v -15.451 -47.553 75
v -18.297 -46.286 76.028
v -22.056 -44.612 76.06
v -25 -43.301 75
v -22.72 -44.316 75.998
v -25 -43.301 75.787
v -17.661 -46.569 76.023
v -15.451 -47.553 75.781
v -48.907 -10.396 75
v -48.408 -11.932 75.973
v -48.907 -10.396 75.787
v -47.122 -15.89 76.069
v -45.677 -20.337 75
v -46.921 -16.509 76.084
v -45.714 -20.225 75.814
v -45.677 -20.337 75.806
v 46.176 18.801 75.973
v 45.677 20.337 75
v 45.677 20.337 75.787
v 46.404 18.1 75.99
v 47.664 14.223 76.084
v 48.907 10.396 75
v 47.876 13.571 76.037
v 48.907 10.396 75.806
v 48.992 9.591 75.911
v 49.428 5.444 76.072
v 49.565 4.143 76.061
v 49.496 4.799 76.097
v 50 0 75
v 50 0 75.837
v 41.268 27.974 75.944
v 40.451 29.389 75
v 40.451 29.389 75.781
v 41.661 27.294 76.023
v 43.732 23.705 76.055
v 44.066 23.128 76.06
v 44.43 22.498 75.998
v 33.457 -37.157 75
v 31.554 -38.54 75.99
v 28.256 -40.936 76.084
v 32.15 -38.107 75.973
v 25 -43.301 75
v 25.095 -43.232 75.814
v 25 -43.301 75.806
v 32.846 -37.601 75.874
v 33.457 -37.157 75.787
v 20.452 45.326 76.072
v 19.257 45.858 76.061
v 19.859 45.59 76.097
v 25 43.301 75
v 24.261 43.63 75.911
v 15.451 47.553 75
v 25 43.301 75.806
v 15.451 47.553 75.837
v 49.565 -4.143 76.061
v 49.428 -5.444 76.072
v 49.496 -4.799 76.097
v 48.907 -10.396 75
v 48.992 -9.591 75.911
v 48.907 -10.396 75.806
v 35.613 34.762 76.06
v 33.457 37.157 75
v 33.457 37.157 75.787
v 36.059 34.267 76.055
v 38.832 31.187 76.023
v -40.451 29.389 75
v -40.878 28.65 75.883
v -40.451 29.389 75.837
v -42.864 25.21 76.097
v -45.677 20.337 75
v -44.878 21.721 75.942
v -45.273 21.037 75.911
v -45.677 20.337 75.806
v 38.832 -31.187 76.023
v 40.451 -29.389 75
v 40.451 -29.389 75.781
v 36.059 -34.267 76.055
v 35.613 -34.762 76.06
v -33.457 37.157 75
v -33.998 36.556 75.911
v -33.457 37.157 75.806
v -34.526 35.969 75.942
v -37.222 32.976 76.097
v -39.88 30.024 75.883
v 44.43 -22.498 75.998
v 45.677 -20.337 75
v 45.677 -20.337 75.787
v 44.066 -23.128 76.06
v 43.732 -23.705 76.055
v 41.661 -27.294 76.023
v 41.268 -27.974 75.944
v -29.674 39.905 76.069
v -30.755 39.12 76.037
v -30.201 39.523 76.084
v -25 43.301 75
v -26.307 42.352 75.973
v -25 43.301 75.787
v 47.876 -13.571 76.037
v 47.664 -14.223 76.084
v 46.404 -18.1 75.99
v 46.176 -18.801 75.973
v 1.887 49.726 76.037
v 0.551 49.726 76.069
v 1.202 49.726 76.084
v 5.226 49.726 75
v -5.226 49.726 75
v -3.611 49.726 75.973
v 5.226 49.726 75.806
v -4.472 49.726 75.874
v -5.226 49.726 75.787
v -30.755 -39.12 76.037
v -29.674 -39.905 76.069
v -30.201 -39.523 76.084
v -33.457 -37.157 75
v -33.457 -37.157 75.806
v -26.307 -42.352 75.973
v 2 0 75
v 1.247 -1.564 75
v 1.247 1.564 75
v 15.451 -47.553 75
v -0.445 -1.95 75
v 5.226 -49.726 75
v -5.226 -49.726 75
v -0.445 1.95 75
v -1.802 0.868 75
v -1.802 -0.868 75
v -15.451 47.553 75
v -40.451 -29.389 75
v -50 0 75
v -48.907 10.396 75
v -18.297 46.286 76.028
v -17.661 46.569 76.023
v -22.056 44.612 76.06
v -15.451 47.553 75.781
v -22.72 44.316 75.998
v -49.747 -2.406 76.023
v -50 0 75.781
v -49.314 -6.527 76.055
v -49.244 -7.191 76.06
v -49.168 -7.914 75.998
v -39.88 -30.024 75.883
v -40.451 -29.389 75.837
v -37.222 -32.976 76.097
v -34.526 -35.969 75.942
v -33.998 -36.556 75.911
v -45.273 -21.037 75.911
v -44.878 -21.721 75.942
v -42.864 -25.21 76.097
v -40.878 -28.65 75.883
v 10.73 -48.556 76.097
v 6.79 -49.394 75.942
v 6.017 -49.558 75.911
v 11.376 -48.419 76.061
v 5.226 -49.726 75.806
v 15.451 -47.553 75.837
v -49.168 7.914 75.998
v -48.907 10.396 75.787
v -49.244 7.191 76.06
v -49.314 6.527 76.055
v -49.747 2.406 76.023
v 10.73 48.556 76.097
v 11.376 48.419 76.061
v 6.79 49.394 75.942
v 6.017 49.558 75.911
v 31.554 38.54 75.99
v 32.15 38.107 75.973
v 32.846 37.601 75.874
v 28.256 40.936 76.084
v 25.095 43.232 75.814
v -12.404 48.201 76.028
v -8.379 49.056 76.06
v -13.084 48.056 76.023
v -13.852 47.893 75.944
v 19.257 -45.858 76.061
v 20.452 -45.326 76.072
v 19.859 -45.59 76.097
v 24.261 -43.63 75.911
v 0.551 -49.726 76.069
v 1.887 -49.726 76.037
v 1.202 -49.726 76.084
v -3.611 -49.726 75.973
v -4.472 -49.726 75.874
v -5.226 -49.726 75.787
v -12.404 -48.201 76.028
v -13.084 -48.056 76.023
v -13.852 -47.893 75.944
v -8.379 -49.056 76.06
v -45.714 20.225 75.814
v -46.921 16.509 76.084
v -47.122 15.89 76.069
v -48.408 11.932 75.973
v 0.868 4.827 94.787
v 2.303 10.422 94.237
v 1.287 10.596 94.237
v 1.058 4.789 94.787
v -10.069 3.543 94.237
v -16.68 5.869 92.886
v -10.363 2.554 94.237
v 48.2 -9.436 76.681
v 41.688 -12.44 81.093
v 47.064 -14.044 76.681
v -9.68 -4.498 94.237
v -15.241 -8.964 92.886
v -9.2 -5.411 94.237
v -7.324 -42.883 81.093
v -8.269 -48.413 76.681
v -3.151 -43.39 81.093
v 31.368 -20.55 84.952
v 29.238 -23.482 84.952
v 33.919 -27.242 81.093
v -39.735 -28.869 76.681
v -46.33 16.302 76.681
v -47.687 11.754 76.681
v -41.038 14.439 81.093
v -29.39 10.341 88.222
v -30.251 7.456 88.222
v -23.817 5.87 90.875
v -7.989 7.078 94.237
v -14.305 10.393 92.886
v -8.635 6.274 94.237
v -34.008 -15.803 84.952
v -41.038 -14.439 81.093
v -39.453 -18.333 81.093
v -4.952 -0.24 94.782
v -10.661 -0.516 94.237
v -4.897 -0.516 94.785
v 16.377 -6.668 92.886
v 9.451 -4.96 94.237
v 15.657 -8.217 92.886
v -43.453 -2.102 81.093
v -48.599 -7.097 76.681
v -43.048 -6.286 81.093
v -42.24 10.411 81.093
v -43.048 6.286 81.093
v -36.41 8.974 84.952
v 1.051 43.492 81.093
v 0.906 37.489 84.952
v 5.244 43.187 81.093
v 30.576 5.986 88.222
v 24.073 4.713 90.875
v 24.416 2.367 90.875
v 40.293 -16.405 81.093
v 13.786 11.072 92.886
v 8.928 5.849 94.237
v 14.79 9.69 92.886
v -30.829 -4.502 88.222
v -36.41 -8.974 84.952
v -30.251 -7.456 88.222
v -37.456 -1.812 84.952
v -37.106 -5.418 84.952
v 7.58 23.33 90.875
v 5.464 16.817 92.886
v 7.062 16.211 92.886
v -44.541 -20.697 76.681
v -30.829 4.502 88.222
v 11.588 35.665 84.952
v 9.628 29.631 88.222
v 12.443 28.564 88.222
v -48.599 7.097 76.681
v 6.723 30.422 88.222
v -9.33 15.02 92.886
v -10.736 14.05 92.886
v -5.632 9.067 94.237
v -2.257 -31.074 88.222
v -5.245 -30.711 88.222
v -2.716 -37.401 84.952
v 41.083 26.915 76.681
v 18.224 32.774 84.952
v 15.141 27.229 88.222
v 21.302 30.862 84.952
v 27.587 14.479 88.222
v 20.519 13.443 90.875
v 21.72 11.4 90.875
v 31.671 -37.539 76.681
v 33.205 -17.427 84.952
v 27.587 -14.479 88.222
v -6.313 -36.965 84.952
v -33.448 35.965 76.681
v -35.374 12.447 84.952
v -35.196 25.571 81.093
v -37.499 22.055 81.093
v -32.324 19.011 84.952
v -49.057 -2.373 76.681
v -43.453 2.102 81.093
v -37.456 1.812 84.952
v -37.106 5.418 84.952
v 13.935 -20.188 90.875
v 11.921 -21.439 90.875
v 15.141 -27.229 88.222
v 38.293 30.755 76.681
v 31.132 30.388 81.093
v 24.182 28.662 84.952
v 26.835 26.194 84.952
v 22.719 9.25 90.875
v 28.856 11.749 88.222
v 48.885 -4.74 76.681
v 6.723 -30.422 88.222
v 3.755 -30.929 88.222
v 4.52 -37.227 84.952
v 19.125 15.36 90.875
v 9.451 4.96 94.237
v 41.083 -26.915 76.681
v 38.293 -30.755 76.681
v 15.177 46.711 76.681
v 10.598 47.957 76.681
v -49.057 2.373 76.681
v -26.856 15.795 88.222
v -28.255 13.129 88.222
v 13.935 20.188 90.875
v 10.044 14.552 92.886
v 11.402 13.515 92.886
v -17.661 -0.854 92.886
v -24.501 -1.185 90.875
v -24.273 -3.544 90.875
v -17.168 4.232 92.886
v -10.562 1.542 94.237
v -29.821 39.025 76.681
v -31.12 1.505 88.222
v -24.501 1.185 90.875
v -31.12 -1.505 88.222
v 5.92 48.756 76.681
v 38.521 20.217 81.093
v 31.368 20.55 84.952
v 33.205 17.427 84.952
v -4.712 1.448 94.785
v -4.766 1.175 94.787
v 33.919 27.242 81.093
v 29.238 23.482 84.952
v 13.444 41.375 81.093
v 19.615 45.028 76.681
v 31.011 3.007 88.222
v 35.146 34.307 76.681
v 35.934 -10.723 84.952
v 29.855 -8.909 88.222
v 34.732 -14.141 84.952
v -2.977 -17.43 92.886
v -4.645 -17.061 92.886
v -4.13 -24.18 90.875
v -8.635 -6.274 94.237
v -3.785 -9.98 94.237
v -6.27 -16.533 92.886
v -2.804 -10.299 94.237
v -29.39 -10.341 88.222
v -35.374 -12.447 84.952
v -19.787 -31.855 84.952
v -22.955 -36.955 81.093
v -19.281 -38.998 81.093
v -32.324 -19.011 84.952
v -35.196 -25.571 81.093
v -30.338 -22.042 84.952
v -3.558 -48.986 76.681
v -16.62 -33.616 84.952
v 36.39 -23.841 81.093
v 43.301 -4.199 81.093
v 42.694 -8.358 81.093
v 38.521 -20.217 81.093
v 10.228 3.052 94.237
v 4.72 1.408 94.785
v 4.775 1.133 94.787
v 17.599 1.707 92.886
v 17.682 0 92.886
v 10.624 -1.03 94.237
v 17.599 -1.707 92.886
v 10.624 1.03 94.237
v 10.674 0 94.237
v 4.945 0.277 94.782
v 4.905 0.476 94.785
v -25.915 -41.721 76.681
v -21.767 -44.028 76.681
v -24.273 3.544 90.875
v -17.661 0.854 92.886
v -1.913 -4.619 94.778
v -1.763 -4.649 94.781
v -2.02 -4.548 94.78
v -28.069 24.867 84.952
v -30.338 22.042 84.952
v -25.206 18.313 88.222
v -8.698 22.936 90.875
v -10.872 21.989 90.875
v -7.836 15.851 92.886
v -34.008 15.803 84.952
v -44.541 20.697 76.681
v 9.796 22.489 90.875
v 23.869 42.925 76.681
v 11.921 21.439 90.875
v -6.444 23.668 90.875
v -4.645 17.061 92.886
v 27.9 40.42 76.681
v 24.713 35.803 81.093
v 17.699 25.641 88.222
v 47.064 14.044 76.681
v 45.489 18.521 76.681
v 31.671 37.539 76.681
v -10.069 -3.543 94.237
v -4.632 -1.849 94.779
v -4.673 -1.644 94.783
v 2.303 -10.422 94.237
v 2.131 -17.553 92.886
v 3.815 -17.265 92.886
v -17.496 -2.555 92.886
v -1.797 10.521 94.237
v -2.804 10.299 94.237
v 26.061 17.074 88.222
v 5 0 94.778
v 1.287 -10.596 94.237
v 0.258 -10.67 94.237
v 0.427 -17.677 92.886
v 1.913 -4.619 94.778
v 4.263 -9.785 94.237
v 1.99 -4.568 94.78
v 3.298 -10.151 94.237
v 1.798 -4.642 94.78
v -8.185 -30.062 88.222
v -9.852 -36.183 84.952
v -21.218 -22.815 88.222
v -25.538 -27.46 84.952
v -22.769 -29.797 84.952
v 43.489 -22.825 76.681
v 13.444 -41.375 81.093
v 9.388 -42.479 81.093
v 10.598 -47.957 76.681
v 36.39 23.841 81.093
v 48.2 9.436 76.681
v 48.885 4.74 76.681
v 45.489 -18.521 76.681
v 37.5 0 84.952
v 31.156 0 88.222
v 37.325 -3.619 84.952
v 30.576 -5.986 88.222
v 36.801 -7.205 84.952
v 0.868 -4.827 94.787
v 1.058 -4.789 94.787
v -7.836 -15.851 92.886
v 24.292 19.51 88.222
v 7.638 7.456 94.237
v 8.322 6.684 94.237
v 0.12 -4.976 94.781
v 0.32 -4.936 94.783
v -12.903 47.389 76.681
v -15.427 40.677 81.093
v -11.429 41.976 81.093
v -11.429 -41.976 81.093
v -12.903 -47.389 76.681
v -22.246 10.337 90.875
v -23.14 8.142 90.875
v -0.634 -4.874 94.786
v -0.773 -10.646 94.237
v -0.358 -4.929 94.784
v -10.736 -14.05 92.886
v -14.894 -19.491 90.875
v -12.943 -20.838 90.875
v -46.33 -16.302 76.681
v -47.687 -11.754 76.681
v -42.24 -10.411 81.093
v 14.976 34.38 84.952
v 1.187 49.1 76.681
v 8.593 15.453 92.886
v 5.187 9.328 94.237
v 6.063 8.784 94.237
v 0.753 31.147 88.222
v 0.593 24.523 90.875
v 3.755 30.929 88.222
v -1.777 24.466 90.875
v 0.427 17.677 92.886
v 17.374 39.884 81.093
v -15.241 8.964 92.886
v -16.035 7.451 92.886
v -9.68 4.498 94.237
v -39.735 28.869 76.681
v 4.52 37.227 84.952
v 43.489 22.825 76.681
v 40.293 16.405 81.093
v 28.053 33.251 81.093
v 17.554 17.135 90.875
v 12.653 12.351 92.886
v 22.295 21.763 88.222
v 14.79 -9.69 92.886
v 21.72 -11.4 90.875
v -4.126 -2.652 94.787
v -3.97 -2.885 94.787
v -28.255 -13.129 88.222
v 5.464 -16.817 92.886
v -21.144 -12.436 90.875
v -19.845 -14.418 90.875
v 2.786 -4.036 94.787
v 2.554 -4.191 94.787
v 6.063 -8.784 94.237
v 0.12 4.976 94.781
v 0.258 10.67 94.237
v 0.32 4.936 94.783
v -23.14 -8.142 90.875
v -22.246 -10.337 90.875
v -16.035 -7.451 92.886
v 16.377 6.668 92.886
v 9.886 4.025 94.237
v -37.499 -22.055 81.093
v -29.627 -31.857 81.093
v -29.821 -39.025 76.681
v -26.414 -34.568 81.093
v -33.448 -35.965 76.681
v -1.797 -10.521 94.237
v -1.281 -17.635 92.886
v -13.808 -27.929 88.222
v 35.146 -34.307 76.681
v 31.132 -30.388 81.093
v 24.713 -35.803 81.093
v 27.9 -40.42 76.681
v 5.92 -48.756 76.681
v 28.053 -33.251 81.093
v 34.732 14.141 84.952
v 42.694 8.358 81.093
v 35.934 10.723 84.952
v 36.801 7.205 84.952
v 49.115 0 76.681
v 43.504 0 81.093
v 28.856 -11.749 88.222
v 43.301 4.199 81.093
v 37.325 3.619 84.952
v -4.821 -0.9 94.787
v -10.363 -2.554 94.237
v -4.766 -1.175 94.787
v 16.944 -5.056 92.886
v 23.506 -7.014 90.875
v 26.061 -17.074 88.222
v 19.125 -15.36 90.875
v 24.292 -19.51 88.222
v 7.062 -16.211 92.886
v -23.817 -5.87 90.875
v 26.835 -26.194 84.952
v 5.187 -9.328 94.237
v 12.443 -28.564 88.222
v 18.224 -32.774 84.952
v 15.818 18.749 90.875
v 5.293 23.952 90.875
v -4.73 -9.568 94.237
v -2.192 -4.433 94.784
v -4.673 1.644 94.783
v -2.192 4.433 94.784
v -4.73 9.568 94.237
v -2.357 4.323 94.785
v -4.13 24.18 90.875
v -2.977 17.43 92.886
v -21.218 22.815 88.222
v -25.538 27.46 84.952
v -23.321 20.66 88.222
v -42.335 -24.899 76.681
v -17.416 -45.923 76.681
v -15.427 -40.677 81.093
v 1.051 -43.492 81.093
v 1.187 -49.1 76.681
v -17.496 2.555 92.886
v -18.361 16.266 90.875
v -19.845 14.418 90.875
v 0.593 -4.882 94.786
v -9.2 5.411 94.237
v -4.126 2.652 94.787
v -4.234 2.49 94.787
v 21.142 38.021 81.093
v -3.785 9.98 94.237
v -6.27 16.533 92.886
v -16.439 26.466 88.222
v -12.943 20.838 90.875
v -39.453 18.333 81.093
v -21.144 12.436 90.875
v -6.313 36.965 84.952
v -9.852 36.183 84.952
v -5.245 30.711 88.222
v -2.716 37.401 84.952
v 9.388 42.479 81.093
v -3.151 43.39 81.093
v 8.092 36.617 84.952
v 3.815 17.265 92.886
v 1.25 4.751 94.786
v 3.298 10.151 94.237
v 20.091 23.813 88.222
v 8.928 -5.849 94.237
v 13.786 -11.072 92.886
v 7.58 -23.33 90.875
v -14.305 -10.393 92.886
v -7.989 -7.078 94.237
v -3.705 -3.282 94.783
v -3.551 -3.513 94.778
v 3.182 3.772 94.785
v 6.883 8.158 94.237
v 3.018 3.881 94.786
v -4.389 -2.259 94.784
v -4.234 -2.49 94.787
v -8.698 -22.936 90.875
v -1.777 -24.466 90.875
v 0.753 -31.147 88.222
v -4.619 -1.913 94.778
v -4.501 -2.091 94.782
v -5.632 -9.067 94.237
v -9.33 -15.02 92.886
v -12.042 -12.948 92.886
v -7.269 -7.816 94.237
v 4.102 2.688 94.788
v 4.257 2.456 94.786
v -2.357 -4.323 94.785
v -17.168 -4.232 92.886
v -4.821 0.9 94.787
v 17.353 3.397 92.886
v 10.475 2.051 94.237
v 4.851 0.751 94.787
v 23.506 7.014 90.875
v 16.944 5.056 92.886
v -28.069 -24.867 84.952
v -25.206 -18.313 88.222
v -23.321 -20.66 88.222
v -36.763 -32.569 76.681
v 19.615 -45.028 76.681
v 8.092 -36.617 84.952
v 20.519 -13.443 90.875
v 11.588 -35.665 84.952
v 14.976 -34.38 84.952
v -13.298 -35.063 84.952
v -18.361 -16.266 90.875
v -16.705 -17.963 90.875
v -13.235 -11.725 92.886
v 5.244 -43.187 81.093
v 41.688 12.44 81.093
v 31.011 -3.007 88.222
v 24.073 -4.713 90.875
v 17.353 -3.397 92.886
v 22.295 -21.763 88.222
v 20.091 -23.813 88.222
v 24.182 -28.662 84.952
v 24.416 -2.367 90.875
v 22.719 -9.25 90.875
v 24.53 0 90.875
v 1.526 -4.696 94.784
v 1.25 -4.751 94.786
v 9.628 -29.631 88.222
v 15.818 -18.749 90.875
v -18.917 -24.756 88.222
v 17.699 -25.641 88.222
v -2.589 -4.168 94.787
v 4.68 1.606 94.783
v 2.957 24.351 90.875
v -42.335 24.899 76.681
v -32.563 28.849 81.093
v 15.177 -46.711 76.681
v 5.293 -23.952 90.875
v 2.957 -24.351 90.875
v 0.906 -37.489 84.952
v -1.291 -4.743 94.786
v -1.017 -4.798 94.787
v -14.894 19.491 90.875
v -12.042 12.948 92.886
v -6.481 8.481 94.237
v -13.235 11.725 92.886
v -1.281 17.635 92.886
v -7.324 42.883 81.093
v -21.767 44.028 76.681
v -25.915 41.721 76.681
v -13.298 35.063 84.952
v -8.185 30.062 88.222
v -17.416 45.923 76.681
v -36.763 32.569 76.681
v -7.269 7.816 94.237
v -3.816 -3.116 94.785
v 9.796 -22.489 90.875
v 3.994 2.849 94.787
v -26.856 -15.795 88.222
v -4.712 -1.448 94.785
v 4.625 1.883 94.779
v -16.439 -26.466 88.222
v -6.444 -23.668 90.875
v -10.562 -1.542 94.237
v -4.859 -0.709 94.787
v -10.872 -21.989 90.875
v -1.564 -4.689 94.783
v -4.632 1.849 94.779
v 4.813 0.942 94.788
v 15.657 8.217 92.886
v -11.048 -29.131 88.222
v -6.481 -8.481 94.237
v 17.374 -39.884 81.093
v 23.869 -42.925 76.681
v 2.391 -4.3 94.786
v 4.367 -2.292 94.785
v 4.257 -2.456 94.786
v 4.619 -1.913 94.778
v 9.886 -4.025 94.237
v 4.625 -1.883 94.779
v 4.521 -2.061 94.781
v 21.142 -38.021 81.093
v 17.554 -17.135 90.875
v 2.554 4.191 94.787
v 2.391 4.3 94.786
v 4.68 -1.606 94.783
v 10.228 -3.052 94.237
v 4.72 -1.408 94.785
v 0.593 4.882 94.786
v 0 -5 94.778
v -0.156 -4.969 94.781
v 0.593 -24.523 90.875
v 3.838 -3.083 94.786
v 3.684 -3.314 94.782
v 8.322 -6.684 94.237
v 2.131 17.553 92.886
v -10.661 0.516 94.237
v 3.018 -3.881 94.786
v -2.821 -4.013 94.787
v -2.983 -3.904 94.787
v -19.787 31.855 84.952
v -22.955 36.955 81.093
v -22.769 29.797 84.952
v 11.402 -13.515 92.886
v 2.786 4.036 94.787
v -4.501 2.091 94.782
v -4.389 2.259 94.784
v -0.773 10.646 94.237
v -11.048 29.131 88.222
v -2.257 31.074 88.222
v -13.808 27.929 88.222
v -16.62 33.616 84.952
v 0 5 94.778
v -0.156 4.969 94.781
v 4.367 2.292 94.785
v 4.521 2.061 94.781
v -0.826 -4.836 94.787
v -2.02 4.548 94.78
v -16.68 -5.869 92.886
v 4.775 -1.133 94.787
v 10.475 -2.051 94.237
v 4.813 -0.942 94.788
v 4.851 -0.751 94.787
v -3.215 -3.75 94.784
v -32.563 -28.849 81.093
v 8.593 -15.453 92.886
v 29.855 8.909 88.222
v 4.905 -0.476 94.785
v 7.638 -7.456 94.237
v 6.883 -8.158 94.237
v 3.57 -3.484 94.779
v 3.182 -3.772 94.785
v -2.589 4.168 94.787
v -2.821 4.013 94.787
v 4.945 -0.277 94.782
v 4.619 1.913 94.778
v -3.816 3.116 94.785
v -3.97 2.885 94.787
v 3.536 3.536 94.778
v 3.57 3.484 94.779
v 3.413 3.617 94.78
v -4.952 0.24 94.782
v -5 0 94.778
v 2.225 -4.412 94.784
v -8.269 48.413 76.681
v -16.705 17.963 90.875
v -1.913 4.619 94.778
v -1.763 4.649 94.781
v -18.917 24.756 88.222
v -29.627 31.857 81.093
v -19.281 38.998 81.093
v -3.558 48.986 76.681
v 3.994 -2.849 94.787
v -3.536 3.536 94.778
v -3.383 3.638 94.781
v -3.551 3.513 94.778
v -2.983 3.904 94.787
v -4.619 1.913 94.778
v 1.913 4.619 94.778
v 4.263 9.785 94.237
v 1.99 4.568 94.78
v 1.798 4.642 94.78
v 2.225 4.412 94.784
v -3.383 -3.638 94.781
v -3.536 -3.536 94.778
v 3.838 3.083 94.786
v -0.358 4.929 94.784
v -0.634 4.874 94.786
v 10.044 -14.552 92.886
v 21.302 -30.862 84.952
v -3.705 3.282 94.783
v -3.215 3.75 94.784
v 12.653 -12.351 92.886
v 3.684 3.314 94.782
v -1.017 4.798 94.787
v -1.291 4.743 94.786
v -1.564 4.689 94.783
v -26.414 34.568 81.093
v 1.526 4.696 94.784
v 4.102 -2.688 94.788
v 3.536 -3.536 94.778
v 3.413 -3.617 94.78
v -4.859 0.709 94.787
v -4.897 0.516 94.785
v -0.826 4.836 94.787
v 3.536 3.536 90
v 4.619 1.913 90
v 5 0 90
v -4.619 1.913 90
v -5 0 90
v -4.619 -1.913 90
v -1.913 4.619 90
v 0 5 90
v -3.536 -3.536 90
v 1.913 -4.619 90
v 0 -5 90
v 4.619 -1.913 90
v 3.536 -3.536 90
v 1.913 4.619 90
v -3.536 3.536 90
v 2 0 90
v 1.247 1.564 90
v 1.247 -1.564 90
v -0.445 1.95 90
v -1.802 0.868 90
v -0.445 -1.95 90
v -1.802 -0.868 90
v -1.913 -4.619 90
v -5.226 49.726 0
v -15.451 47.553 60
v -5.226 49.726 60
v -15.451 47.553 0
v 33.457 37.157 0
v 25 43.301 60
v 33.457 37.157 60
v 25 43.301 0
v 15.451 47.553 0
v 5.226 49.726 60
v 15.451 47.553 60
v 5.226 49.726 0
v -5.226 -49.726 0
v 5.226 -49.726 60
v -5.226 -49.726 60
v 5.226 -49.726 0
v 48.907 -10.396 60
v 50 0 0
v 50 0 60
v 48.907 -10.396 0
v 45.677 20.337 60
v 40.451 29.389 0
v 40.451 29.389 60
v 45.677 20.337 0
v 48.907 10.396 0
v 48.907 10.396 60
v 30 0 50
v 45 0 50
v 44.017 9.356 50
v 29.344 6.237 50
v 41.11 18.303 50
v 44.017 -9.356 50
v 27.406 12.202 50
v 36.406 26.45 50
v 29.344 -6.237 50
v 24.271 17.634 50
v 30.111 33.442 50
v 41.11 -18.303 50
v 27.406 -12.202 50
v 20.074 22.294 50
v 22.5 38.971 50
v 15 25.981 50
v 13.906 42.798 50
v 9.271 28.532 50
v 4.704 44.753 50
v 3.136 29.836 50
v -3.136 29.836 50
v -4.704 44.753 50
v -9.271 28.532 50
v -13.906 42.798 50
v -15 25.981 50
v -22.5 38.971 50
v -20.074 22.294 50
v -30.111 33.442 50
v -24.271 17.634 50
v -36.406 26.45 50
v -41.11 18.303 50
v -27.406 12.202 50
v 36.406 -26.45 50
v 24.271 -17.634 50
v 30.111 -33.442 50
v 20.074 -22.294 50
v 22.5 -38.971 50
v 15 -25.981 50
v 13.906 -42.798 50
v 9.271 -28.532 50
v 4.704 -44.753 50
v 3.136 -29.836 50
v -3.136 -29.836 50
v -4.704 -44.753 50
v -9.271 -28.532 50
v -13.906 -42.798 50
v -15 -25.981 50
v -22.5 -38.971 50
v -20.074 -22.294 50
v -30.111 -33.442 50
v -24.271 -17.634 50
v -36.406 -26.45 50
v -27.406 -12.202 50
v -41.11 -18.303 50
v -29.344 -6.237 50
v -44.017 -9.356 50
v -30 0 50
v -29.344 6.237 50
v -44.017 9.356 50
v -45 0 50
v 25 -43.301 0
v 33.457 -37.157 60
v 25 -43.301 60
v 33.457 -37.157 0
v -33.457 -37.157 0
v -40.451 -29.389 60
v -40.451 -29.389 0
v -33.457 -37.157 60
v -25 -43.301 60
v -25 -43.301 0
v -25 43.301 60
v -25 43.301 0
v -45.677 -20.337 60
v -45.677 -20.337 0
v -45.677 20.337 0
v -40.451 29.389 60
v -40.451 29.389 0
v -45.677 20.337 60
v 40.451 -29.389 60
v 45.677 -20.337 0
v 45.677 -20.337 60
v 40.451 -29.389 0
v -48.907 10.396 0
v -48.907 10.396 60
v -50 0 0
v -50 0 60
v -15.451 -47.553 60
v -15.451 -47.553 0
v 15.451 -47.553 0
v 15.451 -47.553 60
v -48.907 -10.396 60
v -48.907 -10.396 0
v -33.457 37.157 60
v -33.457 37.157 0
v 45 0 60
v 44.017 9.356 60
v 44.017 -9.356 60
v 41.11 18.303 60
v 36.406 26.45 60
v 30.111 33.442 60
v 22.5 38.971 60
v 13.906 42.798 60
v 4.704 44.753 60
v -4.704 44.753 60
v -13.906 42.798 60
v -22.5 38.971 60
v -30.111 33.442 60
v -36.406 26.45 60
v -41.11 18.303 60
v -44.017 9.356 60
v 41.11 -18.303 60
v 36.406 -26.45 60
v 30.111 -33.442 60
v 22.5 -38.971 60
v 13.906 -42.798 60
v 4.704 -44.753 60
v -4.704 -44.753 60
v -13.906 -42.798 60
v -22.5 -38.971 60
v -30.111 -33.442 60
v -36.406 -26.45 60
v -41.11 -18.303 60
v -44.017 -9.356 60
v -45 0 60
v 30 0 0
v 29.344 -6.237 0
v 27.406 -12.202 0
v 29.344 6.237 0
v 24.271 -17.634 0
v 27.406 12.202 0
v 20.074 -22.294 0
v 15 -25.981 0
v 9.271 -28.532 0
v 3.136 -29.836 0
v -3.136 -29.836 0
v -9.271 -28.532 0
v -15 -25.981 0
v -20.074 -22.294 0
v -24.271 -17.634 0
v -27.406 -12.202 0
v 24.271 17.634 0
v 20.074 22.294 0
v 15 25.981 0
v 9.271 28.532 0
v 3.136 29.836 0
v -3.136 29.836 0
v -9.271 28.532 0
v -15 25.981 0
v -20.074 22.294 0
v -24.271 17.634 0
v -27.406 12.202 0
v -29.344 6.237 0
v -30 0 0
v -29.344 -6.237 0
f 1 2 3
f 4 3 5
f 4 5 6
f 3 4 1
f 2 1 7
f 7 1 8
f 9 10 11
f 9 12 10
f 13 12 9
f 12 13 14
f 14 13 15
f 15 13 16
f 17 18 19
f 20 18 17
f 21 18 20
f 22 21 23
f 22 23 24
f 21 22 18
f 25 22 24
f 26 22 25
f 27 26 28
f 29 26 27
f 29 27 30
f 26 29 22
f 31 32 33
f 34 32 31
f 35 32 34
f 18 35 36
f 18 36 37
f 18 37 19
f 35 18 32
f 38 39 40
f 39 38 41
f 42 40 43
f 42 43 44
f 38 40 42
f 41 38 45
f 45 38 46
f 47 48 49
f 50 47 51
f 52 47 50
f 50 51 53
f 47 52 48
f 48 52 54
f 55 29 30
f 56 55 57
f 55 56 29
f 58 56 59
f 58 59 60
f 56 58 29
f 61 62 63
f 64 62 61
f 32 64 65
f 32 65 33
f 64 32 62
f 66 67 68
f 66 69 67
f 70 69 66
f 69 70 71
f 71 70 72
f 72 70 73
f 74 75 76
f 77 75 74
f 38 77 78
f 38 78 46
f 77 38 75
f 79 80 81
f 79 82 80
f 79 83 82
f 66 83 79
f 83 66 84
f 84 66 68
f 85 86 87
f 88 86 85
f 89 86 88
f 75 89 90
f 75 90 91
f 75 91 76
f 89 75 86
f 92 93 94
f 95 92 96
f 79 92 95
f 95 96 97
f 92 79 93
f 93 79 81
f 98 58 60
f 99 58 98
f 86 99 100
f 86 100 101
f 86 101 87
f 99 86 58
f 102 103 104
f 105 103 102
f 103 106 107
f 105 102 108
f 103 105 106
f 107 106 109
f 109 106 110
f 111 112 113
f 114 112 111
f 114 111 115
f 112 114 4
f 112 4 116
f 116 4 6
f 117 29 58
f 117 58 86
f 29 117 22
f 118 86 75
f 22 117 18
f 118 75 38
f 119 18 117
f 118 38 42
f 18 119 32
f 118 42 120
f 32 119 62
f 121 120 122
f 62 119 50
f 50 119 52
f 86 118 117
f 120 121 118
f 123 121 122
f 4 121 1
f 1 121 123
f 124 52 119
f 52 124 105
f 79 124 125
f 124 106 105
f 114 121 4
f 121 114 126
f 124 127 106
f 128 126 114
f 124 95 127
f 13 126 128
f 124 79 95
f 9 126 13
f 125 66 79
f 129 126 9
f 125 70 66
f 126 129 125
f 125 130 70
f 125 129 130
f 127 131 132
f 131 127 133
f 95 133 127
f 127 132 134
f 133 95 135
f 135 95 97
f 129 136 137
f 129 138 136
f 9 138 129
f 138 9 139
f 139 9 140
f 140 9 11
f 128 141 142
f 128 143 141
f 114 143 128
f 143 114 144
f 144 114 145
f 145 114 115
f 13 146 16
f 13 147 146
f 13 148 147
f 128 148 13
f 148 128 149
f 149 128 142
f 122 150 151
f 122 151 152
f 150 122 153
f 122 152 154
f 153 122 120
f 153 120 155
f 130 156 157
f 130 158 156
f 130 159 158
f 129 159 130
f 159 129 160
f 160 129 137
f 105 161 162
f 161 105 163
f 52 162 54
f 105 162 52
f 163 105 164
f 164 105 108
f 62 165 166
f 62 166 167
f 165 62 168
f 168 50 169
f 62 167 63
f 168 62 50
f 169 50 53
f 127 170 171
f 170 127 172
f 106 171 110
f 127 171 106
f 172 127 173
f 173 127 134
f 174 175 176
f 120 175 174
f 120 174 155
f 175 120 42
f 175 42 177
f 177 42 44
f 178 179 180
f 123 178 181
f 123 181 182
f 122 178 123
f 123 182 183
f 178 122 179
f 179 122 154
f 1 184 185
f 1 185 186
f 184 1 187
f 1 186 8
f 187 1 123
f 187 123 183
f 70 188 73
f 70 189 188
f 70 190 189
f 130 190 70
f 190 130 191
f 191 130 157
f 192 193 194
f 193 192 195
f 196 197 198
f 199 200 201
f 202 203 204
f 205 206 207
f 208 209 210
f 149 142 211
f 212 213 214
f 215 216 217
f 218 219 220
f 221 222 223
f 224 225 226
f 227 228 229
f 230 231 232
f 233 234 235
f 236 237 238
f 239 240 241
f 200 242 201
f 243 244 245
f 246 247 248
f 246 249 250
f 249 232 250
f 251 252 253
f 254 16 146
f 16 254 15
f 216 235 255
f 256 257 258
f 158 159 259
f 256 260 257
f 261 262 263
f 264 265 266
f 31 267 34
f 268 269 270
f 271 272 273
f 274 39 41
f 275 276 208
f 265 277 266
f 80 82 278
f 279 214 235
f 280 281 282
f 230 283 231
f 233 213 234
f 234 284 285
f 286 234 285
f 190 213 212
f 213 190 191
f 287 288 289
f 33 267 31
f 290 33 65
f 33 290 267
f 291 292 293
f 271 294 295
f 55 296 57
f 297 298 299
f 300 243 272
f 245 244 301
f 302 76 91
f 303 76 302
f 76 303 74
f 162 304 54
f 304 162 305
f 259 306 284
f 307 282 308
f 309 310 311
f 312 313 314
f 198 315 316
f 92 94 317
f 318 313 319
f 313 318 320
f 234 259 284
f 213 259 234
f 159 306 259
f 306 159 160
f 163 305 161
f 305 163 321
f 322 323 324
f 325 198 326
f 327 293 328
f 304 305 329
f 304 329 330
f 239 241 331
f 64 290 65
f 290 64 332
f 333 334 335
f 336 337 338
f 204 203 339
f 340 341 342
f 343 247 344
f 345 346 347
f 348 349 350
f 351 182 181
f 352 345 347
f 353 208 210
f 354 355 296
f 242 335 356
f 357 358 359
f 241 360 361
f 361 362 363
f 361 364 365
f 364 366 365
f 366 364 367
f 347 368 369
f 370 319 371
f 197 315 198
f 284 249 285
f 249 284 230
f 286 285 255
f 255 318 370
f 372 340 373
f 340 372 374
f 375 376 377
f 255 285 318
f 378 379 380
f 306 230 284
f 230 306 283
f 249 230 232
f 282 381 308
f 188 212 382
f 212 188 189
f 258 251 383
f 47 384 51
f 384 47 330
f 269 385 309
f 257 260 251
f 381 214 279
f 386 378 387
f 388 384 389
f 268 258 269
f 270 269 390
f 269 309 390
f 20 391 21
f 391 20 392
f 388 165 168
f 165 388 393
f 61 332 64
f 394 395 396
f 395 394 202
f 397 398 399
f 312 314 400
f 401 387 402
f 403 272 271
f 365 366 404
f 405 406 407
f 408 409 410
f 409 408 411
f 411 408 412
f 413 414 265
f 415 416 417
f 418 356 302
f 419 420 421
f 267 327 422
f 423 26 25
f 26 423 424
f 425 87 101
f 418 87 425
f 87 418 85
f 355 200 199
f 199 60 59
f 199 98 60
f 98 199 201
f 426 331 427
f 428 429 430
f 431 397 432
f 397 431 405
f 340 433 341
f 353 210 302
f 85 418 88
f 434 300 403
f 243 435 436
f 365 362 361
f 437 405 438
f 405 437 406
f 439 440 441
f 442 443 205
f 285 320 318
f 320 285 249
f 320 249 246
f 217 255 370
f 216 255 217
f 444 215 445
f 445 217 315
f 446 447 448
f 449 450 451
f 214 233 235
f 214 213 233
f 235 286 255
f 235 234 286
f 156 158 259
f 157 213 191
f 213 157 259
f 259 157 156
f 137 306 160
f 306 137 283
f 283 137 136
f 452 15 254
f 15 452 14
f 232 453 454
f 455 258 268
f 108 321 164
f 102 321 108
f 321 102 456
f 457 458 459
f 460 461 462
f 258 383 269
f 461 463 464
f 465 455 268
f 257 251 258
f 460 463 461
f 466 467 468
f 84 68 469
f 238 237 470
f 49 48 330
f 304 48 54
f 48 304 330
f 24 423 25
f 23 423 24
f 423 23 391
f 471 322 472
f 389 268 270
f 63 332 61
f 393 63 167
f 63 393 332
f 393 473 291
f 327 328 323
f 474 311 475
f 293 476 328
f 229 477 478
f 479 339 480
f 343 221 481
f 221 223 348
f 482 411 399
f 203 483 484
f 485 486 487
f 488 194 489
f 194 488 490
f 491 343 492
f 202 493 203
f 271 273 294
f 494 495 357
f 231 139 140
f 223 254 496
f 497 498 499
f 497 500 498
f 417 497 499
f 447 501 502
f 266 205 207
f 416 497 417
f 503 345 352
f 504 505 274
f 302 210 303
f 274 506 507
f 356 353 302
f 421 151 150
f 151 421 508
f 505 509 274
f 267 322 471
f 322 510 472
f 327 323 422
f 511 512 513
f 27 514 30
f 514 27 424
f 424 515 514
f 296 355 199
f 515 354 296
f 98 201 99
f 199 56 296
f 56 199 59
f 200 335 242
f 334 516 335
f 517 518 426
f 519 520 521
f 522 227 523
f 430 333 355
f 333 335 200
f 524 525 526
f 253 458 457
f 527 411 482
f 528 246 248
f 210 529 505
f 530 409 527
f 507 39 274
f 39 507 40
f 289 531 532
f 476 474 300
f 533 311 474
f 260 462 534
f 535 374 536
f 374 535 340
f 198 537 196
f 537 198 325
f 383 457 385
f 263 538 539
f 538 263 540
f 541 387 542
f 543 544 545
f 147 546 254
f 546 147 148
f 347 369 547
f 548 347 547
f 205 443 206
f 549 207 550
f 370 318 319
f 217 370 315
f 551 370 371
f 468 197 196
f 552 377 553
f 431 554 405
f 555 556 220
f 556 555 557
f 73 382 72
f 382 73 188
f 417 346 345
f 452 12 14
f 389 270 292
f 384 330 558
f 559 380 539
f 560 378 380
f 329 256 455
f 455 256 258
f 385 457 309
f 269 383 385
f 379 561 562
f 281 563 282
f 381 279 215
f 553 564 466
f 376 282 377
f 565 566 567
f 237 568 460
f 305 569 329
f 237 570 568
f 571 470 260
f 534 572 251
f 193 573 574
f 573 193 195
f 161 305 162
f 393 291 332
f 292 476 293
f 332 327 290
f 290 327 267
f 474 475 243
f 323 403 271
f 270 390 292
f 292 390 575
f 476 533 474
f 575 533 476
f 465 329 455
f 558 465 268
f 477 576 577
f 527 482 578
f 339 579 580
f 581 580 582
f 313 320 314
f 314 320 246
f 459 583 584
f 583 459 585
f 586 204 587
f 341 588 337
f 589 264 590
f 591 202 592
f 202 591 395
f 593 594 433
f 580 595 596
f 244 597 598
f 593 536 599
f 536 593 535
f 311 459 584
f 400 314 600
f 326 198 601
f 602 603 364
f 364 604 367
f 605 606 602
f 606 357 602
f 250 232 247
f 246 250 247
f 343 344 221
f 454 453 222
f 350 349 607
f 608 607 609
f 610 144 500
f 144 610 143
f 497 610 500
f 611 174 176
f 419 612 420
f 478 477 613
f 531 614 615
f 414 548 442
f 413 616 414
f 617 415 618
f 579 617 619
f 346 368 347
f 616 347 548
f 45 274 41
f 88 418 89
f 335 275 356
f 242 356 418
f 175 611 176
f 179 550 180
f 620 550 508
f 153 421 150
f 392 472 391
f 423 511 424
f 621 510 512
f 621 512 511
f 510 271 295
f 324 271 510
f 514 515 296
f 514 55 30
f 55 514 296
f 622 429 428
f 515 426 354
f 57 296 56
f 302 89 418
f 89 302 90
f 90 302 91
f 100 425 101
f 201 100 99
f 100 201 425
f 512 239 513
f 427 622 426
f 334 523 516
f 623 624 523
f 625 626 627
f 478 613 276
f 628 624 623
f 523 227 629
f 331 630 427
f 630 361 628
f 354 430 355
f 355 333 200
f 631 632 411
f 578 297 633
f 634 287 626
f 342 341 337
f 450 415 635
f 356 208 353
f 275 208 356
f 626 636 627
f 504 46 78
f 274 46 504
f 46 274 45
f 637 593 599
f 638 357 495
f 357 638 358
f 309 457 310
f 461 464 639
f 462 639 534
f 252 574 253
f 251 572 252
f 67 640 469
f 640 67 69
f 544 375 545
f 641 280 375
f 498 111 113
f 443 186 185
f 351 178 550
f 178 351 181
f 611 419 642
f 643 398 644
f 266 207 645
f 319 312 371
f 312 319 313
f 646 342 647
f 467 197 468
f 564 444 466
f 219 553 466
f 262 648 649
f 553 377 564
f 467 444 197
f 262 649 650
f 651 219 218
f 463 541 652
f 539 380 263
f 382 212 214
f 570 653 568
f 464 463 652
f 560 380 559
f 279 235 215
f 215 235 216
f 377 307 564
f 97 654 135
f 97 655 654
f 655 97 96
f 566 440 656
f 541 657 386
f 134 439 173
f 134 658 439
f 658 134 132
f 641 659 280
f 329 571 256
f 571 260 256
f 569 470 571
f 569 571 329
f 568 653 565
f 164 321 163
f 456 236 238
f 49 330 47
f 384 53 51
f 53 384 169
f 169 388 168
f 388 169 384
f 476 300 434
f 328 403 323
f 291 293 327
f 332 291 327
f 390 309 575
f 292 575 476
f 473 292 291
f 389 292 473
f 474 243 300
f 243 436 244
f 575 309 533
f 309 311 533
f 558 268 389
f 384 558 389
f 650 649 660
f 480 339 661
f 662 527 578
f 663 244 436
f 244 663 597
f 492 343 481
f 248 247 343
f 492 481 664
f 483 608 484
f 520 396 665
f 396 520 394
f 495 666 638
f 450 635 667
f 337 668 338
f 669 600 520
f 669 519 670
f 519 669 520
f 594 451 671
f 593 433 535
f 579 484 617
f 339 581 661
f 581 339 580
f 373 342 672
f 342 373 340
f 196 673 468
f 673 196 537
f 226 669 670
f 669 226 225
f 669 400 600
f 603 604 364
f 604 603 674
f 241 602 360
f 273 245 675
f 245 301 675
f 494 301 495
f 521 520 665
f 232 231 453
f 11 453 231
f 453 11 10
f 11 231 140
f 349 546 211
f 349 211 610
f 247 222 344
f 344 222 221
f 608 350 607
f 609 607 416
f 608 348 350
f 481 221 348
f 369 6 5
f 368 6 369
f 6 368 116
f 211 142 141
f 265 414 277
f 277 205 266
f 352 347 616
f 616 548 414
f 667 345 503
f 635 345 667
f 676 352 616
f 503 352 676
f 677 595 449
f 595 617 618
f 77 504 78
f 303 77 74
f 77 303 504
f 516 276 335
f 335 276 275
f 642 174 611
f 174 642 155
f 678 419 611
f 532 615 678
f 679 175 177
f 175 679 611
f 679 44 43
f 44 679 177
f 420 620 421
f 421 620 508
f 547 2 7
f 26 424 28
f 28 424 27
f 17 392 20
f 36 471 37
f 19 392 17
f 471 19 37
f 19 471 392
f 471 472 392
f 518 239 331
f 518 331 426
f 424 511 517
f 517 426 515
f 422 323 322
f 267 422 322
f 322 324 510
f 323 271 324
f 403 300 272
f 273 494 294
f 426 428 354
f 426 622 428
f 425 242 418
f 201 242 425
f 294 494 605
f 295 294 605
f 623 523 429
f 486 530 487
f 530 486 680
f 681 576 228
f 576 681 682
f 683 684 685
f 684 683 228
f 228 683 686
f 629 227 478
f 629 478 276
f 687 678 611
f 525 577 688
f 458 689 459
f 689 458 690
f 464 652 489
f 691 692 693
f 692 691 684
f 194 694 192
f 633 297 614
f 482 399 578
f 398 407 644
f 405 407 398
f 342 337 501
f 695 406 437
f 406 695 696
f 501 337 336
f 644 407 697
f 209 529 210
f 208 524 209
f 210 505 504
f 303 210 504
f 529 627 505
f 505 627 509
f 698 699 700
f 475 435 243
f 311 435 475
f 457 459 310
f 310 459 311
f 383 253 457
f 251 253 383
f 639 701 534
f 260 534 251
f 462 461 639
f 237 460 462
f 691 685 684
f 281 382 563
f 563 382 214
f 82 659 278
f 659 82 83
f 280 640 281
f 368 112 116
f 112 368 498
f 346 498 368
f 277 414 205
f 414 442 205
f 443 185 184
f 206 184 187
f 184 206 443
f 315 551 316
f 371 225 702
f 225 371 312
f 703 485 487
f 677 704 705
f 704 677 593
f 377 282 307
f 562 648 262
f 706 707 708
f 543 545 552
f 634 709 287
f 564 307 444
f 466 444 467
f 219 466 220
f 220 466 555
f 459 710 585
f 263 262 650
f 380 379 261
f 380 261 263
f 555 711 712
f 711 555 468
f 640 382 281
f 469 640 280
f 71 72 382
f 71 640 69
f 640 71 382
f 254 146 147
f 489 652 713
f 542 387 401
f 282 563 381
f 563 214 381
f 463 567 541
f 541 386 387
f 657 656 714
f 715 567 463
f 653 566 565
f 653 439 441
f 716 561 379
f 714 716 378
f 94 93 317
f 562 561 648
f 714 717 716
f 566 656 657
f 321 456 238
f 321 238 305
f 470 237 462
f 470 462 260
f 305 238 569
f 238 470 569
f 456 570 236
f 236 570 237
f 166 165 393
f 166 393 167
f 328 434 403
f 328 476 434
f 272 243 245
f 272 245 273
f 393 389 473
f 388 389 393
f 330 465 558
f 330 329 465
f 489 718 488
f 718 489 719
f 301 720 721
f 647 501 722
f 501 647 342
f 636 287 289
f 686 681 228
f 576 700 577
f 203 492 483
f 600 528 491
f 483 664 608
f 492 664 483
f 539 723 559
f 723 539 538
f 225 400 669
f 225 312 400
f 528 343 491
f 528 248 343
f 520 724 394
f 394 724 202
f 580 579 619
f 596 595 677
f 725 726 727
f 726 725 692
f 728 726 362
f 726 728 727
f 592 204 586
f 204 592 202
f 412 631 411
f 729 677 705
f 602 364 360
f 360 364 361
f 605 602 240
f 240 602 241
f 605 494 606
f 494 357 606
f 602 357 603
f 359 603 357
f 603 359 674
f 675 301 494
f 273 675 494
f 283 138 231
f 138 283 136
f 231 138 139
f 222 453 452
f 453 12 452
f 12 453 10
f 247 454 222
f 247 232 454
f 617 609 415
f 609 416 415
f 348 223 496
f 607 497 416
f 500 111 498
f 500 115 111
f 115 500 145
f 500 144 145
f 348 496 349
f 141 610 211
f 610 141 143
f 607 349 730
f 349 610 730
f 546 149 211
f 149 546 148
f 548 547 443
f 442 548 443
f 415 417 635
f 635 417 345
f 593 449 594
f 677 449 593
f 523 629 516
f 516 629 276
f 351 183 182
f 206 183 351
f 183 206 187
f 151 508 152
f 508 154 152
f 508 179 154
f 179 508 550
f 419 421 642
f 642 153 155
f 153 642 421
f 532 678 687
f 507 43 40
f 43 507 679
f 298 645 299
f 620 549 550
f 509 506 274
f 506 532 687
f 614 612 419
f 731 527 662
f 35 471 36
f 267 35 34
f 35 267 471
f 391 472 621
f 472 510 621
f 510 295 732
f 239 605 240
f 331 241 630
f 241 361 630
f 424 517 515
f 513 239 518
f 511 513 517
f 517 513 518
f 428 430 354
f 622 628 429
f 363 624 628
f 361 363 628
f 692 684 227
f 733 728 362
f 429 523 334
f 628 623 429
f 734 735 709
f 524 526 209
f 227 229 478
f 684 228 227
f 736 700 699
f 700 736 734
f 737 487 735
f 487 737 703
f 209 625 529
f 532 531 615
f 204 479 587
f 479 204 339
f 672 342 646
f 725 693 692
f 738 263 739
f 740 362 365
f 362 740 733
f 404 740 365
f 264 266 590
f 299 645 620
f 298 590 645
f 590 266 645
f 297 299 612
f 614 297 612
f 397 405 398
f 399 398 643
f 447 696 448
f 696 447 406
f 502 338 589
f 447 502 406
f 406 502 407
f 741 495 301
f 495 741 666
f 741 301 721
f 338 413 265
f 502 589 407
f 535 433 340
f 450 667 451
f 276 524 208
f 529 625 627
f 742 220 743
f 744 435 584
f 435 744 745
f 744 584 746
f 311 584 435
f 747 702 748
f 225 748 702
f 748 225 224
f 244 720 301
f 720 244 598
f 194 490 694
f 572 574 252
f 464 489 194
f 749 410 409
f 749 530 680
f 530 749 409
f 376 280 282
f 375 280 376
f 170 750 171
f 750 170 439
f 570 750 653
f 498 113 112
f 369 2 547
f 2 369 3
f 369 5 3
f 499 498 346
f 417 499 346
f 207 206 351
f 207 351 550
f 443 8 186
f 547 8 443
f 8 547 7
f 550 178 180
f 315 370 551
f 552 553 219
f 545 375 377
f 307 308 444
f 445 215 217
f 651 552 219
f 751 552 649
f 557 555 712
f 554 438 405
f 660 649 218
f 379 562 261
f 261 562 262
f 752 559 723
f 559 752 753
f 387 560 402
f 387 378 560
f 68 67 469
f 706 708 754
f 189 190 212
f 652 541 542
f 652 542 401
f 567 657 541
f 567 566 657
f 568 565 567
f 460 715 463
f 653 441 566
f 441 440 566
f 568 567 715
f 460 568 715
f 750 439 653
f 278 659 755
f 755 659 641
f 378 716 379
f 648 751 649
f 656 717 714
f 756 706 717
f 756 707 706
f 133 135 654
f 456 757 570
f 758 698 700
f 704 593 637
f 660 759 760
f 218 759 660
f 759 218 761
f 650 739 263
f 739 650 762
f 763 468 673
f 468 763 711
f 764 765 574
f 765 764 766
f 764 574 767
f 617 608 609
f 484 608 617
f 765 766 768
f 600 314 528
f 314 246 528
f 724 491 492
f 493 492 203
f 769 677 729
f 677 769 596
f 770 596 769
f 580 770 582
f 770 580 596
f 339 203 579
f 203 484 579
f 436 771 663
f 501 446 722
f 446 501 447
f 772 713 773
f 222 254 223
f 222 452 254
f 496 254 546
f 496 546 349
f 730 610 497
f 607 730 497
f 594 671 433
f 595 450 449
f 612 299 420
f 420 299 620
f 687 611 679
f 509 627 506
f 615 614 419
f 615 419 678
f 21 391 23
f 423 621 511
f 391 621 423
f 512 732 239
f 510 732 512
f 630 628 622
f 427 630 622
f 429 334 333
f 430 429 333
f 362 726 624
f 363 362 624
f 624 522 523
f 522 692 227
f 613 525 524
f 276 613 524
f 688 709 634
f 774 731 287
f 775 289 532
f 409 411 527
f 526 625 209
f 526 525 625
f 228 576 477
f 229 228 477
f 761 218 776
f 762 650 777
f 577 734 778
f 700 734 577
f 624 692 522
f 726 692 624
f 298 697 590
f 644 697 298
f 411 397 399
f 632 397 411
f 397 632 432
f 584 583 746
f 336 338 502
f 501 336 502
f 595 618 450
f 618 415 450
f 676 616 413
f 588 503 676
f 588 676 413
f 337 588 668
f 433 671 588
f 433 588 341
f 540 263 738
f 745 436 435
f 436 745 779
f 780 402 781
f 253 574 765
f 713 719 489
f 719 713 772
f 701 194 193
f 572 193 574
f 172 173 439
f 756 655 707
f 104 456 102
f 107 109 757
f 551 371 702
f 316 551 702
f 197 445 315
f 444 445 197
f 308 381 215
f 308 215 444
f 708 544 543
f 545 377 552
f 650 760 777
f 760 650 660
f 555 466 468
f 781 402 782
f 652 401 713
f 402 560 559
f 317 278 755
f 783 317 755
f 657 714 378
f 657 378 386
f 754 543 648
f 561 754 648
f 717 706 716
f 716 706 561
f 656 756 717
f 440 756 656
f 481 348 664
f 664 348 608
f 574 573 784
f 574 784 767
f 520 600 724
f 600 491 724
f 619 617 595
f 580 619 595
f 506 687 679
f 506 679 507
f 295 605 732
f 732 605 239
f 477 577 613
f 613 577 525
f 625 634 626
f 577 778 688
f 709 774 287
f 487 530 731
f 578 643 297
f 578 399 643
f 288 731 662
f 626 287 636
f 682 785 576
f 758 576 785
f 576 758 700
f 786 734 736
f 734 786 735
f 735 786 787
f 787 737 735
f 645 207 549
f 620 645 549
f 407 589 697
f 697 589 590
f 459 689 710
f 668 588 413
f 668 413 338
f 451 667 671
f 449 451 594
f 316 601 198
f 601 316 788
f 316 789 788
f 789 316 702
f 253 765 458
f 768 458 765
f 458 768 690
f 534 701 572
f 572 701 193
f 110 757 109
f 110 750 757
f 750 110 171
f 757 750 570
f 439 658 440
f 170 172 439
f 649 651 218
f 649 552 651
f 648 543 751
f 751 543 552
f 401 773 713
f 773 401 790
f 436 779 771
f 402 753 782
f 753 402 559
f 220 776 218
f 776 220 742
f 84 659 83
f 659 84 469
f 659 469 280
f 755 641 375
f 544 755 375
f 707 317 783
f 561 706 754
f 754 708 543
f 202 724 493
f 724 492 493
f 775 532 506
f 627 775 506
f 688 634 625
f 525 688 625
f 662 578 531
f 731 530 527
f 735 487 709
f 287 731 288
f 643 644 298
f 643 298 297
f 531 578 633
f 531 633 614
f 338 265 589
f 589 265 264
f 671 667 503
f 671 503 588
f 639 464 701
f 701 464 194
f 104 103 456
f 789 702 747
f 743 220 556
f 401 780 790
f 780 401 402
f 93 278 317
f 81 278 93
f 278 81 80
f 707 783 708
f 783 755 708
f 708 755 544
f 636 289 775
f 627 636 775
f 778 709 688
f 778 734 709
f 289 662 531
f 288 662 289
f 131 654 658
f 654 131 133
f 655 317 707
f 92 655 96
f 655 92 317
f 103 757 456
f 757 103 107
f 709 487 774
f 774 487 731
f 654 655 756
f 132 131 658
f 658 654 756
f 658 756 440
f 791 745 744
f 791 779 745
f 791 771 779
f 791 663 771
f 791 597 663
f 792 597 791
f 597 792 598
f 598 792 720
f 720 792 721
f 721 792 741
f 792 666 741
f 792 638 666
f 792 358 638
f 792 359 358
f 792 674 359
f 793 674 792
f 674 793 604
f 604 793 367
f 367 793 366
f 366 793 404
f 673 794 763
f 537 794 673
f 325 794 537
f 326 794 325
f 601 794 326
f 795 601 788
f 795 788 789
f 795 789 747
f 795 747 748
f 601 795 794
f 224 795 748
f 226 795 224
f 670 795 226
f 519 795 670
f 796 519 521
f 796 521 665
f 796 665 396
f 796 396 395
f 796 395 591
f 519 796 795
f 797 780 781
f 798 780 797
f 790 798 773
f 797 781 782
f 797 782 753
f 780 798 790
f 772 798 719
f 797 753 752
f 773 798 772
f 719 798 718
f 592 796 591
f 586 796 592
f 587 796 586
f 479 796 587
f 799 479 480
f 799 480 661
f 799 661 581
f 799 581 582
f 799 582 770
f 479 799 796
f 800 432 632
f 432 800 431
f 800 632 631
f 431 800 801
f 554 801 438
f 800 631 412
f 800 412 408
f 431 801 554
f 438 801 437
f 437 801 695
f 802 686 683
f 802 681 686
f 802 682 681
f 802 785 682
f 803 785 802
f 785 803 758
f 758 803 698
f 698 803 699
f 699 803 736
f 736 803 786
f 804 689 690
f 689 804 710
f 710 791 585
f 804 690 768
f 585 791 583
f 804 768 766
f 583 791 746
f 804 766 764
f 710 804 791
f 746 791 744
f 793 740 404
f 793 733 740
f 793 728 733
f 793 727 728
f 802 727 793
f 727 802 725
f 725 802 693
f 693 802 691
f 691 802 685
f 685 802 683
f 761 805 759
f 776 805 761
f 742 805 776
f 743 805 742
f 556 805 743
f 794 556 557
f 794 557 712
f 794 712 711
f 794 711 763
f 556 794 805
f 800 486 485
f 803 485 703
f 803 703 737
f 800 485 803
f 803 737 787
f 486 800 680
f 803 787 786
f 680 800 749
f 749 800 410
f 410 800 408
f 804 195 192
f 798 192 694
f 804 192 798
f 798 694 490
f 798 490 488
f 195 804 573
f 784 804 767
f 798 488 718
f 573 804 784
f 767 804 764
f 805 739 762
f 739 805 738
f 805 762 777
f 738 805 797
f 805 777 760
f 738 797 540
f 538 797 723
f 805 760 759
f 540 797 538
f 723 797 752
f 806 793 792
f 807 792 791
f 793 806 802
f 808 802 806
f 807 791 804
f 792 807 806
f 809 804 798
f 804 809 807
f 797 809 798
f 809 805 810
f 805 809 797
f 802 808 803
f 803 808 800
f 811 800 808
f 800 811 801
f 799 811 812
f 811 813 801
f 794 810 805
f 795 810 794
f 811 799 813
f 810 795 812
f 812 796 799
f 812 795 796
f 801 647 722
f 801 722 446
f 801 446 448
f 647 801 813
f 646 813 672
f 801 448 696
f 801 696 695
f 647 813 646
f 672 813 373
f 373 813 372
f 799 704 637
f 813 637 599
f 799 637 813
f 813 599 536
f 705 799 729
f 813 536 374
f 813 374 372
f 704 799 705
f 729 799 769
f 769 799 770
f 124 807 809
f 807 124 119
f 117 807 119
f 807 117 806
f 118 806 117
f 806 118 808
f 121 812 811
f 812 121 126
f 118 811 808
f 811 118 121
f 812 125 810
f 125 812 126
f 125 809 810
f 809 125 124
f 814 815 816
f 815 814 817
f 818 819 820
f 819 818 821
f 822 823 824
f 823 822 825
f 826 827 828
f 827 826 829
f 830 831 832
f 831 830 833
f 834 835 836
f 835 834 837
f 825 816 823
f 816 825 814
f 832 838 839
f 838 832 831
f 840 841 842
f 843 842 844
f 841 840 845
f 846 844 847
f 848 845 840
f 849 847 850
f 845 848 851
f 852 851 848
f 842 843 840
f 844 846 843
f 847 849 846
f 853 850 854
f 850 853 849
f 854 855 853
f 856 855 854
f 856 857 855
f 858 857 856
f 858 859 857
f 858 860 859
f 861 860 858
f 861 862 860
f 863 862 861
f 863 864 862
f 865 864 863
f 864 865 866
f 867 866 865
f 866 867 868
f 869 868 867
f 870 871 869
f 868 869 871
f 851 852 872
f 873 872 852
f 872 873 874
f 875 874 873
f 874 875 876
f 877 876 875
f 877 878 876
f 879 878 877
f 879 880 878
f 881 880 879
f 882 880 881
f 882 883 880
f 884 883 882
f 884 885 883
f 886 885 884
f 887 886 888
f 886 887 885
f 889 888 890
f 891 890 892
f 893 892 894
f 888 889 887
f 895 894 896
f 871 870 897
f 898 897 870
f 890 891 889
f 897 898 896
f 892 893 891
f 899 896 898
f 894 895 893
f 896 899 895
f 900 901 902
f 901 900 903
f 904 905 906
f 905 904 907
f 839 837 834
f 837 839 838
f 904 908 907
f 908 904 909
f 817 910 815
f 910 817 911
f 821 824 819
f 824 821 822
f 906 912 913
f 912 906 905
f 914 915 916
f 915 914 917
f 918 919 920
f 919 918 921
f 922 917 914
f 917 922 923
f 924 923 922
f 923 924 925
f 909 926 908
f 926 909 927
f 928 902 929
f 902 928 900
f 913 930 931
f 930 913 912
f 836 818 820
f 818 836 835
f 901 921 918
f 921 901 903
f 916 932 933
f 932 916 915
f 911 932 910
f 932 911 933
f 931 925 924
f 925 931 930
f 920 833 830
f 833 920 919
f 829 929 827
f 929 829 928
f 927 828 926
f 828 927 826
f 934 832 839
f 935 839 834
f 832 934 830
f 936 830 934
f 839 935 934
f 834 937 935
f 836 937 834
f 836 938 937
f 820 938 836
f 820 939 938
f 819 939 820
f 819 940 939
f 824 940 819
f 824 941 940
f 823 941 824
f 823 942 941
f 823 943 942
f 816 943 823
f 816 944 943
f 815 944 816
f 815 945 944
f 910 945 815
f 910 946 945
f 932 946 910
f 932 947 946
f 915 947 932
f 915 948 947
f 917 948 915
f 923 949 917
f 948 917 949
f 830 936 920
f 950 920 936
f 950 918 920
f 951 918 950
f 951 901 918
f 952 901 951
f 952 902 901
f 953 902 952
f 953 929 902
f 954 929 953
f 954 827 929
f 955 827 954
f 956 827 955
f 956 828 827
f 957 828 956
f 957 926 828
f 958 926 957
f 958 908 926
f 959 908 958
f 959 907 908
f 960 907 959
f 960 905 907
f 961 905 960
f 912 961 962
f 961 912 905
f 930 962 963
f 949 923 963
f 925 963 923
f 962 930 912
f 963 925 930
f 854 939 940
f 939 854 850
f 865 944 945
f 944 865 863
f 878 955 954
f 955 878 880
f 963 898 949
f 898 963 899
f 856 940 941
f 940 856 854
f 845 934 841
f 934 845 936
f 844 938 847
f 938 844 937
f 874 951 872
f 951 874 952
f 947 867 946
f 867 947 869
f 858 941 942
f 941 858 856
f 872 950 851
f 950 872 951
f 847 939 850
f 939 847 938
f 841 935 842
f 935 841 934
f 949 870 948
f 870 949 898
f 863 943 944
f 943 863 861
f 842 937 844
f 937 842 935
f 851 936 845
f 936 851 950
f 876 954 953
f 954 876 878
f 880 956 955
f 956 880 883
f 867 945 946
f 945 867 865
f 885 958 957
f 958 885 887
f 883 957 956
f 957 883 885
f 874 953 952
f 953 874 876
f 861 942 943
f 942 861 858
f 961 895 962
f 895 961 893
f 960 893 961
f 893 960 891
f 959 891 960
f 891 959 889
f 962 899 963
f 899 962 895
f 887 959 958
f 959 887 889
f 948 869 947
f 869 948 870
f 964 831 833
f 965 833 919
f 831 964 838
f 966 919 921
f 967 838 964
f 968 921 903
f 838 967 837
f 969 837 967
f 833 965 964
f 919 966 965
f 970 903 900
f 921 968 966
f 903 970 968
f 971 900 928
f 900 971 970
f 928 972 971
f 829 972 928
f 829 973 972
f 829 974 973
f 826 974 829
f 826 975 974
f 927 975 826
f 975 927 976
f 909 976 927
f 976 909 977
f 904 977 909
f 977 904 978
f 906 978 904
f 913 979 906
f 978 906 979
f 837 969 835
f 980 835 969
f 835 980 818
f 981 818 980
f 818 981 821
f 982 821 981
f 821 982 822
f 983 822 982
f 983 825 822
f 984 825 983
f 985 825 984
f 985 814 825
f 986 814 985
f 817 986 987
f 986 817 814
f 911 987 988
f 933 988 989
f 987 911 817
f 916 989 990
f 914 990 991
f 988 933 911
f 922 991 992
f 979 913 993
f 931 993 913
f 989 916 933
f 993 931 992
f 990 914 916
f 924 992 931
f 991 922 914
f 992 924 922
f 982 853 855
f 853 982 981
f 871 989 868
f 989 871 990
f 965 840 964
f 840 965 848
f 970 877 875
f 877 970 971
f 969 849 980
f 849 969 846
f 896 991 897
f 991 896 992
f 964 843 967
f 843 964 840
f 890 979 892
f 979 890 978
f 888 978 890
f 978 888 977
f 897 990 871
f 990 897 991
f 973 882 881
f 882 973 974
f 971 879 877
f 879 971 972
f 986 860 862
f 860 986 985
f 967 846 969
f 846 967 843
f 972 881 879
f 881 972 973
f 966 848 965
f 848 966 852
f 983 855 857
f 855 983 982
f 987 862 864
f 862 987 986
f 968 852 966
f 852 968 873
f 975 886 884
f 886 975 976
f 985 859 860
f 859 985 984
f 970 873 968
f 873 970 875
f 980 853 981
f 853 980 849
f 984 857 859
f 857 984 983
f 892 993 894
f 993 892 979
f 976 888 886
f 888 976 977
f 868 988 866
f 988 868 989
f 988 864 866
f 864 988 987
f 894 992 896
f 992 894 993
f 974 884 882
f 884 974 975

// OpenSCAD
translate([0,0,20])
difference()
{
intersection()
{
translate([0,0,55])
cylinder(20, 50, 50);
sphere(r=75, $fn=65);
}
translate([0,0,70])
cylinder(5,5,5);

cylinder(100,2,2);
}


translate([0,0,50])
difference()
{
        cylinder(10, 50, 50);
cylinder(10, 45,45);
}

difference()
{
    cylinder(50, 50, 50);
    cylinder(50, 30,30);
}
